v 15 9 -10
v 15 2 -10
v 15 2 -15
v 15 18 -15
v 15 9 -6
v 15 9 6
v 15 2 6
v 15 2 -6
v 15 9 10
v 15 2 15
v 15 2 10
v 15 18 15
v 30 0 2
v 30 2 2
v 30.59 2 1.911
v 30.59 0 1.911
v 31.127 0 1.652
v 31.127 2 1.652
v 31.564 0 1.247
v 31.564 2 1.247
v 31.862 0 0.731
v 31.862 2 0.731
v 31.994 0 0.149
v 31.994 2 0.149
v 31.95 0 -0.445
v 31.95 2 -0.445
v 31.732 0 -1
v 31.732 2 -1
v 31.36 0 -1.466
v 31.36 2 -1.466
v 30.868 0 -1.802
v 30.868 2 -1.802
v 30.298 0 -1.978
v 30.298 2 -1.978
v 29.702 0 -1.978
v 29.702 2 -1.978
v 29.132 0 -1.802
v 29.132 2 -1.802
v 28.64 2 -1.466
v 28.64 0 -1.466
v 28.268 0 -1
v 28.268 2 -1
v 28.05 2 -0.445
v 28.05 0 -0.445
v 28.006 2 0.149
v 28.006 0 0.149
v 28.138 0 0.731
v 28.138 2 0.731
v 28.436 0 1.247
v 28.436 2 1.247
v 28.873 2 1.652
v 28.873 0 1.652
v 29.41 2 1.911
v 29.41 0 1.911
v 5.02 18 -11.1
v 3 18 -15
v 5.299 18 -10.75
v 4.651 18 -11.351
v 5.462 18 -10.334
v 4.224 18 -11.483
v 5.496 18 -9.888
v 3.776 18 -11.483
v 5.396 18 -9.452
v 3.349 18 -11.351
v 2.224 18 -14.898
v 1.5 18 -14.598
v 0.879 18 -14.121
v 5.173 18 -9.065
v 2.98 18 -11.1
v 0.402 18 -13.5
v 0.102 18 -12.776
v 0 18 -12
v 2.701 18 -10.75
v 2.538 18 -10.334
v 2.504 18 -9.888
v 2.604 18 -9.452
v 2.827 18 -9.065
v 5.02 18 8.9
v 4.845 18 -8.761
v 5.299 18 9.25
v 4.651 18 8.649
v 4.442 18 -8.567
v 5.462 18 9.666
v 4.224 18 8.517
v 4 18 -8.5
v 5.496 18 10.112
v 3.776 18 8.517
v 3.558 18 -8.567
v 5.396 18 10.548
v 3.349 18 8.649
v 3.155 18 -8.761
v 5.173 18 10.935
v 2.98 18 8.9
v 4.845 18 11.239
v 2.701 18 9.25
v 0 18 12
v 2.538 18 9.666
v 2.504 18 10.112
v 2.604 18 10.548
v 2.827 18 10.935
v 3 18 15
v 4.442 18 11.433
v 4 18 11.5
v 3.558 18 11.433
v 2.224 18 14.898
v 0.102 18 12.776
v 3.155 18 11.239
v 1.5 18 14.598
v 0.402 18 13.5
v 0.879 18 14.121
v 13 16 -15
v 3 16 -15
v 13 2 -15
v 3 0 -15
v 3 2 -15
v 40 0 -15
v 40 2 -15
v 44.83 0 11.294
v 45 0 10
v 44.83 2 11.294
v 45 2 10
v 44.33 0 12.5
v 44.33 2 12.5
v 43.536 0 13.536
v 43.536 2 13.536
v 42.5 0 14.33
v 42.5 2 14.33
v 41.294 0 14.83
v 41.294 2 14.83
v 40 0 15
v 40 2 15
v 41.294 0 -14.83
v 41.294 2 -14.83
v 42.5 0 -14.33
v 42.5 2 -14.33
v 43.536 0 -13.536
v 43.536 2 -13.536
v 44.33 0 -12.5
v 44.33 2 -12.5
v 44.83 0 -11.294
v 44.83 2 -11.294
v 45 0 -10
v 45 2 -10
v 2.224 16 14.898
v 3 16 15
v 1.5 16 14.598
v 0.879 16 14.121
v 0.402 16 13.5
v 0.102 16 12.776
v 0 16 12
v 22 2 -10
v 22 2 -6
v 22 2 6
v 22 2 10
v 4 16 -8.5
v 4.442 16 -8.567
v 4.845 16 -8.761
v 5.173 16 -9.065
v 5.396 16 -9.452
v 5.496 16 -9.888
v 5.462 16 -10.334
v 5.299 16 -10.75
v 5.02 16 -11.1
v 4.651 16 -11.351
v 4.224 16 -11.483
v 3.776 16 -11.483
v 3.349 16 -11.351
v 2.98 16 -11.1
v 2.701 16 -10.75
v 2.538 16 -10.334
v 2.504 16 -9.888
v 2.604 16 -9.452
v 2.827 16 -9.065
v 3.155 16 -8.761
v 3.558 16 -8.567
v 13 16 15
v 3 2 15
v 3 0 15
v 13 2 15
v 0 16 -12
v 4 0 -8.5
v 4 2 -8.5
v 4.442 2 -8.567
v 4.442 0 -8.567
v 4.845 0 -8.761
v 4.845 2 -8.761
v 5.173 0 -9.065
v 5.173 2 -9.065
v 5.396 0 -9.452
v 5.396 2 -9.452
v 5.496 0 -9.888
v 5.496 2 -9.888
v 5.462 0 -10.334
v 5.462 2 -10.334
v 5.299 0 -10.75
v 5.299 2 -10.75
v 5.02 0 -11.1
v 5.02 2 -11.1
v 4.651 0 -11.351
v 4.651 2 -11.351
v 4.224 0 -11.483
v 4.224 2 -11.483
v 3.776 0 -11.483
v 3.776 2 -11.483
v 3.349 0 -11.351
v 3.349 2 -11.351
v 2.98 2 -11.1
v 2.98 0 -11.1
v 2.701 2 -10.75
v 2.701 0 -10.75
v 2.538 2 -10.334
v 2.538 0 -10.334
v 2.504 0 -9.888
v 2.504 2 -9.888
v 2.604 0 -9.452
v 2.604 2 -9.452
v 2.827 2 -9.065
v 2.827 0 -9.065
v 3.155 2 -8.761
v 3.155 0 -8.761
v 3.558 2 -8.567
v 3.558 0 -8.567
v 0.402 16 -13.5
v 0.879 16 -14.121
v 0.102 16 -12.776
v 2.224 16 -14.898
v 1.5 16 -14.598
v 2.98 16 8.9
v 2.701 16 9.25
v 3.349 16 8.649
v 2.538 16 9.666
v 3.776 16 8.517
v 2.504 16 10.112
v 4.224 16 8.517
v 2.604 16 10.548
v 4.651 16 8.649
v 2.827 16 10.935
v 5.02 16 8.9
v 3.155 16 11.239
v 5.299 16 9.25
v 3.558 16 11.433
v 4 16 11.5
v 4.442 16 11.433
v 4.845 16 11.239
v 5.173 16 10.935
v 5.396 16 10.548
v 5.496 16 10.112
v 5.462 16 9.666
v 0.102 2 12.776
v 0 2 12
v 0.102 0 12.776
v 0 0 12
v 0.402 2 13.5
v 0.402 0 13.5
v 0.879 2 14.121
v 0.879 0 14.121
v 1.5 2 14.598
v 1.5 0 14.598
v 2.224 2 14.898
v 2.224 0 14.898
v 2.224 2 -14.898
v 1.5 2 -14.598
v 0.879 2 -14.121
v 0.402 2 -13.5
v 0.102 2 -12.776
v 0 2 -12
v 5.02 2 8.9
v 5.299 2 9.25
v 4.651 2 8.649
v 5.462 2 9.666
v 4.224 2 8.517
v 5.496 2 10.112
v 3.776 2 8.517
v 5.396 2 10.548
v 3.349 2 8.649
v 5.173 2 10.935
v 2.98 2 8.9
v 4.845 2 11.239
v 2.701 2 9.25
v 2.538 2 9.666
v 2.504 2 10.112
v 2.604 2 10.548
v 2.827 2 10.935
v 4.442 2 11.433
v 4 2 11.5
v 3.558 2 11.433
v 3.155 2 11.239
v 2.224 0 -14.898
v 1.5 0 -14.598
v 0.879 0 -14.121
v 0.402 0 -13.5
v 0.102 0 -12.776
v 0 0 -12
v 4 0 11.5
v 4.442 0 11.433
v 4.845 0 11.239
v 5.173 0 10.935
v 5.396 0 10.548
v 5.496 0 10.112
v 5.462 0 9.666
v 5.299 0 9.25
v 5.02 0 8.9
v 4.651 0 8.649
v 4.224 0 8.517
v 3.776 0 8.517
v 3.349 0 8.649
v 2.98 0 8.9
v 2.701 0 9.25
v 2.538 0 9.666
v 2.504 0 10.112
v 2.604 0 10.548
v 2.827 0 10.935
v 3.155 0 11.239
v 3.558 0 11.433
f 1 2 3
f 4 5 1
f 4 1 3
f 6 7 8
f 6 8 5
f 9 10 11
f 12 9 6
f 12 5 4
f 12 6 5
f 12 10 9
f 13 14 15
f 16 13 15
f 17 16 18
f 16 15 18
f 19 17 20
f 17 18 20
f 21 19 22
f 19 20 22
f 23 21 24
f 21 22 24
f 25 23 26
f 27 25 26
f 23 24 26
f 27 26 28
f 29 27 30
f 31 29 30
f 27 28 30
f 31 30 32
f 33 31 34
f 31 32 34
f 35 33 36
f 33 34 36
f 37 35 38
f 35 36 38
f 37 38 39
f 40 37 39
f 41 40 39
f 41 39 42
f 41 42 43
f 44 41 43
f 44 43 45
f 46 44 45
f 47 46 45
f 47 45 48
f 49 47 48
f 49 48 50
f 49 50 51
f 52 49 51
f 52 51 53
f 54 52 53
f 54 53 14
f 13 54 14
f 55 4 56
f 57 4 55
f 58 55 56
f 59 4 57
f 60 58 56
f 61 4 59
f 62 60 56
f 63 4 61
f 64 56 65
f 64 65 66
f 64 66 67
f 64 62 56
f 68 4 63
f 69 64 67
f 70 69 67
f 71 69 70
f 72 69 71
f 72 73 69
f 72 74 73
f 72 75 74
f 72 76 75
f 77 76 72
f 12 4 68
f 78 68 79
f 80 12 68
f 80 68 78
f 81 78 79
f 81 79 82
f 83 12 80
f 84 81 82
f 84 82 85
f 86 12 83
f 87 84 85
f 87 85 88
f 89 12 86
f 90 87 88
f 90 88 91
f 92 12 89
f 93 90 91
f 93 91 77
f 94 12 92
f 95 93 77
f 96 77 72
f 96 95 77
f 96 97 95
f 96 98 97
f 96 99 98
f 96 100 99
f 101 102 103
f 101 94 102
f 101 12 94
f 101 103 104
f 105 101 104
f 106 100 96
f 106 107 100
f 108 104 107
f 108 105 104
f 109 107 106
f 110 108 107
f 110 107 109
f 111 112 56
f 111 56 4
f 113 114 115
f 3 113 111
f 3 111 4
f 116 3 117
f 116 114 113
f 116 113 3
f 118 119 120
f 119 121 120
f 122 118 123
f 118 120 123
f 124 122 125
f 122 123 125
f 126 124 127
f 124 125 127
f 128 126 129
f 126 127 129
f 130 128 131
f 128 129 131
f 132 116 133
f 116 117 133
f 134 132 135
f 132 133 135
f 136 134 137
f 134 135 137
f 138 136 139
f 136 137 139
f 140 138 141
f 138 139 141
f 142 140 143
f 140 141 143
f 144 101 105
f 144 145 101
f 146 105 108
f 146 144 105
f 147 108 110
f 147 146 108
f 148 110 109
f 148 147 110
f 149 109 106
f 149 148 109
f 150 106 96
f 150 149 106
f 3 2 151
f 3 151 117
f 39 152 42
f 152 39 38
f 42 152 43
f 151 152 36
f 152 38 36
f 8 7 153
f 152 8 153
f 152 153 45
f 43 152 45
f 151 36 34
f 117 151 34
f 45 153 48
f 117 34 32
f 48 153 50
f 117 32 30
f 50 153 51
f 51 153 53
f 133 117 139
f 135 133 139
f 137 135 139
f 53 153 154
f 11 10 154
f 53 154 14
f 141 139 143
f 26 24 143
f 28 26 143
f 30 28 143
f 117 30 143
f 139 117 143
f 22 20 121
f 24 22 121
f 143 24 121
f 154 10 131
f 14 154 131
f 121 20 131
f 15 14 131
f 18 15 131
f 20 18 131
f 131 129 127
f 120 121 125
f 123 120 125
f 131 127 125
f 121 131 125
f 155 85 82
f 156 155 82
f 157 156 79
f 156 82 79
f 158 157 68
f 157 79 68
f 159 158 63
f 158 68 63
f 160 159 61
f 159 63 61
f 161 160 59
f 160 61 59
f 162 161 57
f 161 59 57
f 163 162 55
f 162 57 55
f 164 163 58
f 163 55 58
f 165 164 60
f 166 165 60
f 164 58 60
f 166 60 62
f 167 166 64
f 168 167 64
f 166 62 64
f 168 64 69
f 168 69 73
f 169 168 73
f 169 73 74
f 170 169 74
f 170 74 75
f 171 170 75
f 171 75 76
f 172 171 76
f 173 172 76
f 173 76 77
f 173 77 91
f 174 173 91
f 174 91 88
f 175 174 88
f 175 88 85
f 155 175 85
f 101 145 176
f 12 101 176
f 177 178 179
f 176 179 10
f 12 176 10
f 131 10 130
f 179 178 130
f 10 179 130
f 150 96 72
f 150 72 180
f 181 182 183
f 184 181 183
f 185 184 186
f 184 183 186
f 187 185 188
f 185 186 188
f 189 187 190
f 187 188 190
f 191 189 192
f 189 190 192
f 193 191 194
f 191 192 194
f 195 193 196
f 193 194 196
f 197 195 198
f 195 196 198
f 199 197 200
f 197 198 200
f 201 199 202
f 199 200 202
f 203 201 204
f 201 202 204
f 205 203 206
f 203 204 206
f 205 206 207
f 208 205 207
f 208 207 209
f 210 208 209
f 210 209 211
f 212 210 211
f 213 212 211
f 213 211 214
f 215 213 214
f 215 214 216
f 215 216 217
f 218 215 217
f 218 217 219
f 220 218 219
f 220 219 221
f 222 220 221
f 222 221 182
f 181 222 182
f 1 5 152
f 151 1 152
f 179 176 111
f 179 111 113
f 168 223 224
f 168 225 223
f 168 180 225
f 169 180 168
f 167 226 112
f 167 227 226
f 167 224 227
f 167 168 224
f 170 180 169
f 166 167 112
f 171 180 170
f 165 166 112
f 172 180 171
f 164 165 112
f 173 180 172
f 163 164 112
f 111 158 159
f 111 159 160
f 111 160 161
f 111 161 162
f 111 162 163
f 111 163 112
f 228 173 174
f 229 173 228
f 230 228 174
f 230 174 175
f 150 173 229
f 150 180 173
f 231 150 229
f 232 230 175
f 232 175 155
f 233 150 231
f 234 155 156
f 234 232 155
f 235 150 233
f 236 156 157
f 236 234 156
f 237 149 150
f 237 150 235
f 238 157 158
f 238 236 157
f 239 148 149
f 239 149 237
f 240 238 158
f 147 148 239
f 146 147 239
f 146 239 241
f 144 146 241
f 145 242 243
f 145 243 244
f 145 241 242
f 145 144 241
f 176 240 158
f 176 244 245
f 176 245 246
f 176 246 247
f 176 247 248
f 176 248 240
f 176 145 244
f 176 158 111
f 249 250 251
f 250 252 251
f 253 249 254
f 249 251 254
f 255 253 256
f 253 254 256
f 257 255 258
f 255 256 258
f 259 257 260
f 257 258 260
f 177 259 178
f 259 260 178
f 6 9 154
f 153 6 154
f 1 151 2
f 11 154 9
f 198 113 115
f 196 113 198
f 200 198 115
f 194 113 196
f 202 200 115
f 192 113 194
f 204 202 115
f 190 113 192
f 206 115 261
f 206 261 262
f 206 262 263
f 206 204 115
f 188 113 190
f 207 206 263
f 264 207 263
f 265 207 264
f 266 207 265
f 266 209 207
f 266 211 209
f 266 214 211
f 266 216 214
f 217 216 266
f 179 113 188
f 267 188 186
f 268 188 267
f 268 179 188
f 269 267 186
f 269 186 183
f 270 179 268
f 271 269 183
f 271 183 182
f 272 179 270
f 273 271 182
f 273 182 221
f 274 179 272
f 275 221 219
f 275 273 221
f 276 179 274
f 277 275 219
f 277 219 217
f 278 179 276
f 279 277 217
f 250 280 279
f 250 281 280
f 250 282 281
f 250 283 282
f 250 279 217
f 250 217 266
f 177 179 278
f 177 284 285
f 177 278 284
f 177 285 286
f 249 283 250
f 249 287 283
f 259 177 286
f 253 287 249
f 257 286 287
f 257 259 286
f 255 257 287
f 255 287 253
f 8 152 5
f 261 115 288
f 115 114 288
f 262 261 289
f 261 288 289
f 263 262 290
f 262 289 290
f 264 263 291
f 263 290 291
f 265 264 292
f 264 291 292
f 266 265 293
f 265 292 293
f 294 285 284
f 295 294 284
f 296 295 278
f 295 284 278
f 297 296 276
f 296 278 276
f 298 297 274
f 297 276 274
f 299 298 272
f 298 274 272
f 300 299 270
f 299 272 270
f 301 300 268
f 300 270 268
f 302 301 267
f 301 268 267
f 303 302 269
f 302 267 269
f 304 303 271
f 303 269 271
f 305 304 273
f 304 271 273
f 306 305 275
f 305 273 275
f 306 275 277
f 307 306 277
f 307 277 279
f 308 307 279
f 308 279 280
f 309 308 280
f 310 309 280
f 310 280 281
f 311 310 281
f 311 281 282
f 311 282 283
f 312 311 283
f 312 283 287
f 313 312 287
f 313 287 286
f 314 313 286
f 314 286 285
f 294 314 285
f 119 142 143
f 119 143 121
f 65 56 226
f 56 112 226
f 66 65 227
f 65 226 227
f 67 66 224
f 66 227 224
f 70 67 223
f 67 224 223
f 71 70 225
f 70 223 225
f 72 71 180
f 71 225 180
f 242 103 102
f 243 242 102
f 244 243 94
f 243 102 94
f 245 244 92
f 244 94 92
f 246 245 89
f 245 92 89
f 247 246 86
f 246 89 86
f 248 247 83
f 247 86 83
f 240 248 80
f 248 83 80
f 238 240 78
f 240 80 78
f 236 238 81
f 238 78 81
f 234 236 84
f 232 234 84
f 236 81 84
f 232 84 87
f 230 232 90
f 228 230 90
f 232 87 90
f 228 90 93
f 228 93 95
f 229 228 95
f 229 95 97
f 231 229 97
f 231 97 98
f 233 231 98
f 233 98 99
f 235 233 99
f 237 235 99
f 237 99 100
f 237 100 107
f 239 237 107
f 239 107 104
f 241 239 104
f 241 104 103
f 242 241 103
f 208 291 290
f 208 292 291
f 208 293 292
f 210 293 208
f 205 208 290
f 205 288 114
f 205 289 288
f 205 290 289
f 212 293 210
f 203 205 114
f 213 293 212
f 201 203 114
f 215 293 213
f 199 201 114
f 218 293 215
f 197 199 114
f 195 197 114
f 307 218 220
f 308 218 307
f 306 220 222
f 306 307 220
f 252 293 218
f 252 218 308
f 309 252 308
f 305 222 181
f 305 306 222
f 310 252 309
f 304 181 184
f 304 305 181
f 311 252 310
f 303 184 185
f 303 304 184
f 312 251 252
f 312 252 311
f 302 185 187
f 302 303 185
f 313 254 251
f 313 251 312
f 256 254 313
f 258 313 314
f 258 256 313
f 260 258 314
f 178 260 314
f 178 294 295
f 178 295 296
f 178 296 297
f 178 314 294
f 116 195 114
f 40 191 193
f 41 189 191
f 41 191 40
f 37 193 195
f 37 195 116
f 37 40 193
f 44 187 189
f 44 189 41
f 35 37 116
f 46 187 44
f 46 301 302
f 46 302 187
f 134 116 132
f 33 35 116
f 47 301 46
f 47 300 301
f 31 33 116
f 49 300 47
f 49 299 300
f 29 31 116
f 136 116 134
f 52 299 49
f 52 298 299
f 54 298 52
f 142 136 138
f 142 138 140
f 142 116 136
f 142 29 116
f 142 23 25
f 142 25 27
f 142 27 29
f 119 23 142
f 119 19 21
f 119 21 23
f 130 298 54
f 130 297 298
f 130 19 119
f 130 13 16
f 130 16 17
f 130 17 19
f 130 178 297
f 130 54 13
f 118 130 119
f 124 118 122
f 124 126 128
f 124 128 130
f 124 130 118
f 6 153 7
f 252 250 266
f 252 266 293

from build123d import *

# Parameters (mm, degrees)
BOSS_EXTRUDE1_DEPTH = 15
SKETCH2_R           = 1.5
CUT_EXTRUDE1_DEPTH  = 28.820855486
FILLET1_R           = 3
SKETCH3_W           = 30
SKETCH3_H           = 30
BOSS_EXTRUDE2_DEPTH = 2
BOSS_EXTRUDE3_DEPTH = 10
CUT_EXTRUDE2_DEPTH  = 6
SKETCH7_R           = 2
CUT_EXTRUDE3_DEPTH  = 12
FILLET2_R           = 5


with BuildPart() as part:
    # Sketch1 → Boss-Extrude1 (new, symmetric)
    with BuildSketch(Plane.XY):
        Polygon((0, 0), (15, 0), (15, 18), (0, 18), (0, 16), (13, 16), (13, 2), (0, 2), align=None)
    extrude(amount=BOSS_EXTRUDE1_DEPTH, both=True)

    # Sketch2 → Cut-Extrude1 (cut, through all)
    with BuildSketch(Plane(origin=(0, 18, 0), x_dir=(1, 0, 0), z_dir=(0, 1, 0))):
        with Locations(Location((4, 10, 0), (0, 0, 270))):
            Circle(SKETCH2_R)
        with Locations(Location((4, -10, 0), (0, 0, 270))):
            Circle(SKETCH2_R)
    extrude(amount=-CUT_EXTRUDE1_DEPTH, mode=Mode.SUBTRACT)

    # Fillet1
    fillet1_edges = [part.edges().sort_by_distance(p)[0] for p in [
        (0, 1, -15),
        (0, 17, 15),
        (0, 1, 15),
        (0, 17, -15),
    ]]
    fillet(fillet1_edges, radius=FILLET1_R)

    # Sketch3 → Boss-Extrude2 (add)
    with BuildSketch(Plane.XZ):
        with Locations((30, 0)):
            Rectangle(SKETCH3_W, SKETCH3_H)
    extrude(amount=-BOSS_EXTRUDE2_DEPTH)

    # Sketch5 → Boss-Extrude3 (add, symmetric)
    with BuildSketch(Plane.XY):
        Polygon((15, 2), (15, 9), (22, 2), align=None)
    extrude(amount=BOSS_EXTRUDE3_DEPTH, both=True)

    # Sketch6 → Cut-Extrude2 (cut, symmetric)
    with BuildSketch(Plane.XY):
        Polygon((15, 2), (15, 9), (22, 2), align=None)
    extrude(amount=CUT_EXTRUDE2_DEPTH, both=True, mode=Mode.SUBTRACT)

    # Sketch7 → Cut-Extrude3 (cut)
    with BuildSketch(Plane(origin=(0, 2, 0), x_dir=(1, 0, 0), z_dir=(0, 1, 0))):
        with Locations(Location((30, 0, 0), (0, 0, 270))):
            Circle(SKETCH7_R)
    extrude(amount=-CUT_EXTRUDE3_DEPTH, mode=Mode.SUBTRACT)

    # Fillet2
    fillet2_edges = [part.edges().sort_by_distance(p)[0] for p in [
        (45, 1, 15),
        (45, 1, -15),
    ]]
    fillet(fillet2_edges, radius=FILLET2_R)


solid = part.part
